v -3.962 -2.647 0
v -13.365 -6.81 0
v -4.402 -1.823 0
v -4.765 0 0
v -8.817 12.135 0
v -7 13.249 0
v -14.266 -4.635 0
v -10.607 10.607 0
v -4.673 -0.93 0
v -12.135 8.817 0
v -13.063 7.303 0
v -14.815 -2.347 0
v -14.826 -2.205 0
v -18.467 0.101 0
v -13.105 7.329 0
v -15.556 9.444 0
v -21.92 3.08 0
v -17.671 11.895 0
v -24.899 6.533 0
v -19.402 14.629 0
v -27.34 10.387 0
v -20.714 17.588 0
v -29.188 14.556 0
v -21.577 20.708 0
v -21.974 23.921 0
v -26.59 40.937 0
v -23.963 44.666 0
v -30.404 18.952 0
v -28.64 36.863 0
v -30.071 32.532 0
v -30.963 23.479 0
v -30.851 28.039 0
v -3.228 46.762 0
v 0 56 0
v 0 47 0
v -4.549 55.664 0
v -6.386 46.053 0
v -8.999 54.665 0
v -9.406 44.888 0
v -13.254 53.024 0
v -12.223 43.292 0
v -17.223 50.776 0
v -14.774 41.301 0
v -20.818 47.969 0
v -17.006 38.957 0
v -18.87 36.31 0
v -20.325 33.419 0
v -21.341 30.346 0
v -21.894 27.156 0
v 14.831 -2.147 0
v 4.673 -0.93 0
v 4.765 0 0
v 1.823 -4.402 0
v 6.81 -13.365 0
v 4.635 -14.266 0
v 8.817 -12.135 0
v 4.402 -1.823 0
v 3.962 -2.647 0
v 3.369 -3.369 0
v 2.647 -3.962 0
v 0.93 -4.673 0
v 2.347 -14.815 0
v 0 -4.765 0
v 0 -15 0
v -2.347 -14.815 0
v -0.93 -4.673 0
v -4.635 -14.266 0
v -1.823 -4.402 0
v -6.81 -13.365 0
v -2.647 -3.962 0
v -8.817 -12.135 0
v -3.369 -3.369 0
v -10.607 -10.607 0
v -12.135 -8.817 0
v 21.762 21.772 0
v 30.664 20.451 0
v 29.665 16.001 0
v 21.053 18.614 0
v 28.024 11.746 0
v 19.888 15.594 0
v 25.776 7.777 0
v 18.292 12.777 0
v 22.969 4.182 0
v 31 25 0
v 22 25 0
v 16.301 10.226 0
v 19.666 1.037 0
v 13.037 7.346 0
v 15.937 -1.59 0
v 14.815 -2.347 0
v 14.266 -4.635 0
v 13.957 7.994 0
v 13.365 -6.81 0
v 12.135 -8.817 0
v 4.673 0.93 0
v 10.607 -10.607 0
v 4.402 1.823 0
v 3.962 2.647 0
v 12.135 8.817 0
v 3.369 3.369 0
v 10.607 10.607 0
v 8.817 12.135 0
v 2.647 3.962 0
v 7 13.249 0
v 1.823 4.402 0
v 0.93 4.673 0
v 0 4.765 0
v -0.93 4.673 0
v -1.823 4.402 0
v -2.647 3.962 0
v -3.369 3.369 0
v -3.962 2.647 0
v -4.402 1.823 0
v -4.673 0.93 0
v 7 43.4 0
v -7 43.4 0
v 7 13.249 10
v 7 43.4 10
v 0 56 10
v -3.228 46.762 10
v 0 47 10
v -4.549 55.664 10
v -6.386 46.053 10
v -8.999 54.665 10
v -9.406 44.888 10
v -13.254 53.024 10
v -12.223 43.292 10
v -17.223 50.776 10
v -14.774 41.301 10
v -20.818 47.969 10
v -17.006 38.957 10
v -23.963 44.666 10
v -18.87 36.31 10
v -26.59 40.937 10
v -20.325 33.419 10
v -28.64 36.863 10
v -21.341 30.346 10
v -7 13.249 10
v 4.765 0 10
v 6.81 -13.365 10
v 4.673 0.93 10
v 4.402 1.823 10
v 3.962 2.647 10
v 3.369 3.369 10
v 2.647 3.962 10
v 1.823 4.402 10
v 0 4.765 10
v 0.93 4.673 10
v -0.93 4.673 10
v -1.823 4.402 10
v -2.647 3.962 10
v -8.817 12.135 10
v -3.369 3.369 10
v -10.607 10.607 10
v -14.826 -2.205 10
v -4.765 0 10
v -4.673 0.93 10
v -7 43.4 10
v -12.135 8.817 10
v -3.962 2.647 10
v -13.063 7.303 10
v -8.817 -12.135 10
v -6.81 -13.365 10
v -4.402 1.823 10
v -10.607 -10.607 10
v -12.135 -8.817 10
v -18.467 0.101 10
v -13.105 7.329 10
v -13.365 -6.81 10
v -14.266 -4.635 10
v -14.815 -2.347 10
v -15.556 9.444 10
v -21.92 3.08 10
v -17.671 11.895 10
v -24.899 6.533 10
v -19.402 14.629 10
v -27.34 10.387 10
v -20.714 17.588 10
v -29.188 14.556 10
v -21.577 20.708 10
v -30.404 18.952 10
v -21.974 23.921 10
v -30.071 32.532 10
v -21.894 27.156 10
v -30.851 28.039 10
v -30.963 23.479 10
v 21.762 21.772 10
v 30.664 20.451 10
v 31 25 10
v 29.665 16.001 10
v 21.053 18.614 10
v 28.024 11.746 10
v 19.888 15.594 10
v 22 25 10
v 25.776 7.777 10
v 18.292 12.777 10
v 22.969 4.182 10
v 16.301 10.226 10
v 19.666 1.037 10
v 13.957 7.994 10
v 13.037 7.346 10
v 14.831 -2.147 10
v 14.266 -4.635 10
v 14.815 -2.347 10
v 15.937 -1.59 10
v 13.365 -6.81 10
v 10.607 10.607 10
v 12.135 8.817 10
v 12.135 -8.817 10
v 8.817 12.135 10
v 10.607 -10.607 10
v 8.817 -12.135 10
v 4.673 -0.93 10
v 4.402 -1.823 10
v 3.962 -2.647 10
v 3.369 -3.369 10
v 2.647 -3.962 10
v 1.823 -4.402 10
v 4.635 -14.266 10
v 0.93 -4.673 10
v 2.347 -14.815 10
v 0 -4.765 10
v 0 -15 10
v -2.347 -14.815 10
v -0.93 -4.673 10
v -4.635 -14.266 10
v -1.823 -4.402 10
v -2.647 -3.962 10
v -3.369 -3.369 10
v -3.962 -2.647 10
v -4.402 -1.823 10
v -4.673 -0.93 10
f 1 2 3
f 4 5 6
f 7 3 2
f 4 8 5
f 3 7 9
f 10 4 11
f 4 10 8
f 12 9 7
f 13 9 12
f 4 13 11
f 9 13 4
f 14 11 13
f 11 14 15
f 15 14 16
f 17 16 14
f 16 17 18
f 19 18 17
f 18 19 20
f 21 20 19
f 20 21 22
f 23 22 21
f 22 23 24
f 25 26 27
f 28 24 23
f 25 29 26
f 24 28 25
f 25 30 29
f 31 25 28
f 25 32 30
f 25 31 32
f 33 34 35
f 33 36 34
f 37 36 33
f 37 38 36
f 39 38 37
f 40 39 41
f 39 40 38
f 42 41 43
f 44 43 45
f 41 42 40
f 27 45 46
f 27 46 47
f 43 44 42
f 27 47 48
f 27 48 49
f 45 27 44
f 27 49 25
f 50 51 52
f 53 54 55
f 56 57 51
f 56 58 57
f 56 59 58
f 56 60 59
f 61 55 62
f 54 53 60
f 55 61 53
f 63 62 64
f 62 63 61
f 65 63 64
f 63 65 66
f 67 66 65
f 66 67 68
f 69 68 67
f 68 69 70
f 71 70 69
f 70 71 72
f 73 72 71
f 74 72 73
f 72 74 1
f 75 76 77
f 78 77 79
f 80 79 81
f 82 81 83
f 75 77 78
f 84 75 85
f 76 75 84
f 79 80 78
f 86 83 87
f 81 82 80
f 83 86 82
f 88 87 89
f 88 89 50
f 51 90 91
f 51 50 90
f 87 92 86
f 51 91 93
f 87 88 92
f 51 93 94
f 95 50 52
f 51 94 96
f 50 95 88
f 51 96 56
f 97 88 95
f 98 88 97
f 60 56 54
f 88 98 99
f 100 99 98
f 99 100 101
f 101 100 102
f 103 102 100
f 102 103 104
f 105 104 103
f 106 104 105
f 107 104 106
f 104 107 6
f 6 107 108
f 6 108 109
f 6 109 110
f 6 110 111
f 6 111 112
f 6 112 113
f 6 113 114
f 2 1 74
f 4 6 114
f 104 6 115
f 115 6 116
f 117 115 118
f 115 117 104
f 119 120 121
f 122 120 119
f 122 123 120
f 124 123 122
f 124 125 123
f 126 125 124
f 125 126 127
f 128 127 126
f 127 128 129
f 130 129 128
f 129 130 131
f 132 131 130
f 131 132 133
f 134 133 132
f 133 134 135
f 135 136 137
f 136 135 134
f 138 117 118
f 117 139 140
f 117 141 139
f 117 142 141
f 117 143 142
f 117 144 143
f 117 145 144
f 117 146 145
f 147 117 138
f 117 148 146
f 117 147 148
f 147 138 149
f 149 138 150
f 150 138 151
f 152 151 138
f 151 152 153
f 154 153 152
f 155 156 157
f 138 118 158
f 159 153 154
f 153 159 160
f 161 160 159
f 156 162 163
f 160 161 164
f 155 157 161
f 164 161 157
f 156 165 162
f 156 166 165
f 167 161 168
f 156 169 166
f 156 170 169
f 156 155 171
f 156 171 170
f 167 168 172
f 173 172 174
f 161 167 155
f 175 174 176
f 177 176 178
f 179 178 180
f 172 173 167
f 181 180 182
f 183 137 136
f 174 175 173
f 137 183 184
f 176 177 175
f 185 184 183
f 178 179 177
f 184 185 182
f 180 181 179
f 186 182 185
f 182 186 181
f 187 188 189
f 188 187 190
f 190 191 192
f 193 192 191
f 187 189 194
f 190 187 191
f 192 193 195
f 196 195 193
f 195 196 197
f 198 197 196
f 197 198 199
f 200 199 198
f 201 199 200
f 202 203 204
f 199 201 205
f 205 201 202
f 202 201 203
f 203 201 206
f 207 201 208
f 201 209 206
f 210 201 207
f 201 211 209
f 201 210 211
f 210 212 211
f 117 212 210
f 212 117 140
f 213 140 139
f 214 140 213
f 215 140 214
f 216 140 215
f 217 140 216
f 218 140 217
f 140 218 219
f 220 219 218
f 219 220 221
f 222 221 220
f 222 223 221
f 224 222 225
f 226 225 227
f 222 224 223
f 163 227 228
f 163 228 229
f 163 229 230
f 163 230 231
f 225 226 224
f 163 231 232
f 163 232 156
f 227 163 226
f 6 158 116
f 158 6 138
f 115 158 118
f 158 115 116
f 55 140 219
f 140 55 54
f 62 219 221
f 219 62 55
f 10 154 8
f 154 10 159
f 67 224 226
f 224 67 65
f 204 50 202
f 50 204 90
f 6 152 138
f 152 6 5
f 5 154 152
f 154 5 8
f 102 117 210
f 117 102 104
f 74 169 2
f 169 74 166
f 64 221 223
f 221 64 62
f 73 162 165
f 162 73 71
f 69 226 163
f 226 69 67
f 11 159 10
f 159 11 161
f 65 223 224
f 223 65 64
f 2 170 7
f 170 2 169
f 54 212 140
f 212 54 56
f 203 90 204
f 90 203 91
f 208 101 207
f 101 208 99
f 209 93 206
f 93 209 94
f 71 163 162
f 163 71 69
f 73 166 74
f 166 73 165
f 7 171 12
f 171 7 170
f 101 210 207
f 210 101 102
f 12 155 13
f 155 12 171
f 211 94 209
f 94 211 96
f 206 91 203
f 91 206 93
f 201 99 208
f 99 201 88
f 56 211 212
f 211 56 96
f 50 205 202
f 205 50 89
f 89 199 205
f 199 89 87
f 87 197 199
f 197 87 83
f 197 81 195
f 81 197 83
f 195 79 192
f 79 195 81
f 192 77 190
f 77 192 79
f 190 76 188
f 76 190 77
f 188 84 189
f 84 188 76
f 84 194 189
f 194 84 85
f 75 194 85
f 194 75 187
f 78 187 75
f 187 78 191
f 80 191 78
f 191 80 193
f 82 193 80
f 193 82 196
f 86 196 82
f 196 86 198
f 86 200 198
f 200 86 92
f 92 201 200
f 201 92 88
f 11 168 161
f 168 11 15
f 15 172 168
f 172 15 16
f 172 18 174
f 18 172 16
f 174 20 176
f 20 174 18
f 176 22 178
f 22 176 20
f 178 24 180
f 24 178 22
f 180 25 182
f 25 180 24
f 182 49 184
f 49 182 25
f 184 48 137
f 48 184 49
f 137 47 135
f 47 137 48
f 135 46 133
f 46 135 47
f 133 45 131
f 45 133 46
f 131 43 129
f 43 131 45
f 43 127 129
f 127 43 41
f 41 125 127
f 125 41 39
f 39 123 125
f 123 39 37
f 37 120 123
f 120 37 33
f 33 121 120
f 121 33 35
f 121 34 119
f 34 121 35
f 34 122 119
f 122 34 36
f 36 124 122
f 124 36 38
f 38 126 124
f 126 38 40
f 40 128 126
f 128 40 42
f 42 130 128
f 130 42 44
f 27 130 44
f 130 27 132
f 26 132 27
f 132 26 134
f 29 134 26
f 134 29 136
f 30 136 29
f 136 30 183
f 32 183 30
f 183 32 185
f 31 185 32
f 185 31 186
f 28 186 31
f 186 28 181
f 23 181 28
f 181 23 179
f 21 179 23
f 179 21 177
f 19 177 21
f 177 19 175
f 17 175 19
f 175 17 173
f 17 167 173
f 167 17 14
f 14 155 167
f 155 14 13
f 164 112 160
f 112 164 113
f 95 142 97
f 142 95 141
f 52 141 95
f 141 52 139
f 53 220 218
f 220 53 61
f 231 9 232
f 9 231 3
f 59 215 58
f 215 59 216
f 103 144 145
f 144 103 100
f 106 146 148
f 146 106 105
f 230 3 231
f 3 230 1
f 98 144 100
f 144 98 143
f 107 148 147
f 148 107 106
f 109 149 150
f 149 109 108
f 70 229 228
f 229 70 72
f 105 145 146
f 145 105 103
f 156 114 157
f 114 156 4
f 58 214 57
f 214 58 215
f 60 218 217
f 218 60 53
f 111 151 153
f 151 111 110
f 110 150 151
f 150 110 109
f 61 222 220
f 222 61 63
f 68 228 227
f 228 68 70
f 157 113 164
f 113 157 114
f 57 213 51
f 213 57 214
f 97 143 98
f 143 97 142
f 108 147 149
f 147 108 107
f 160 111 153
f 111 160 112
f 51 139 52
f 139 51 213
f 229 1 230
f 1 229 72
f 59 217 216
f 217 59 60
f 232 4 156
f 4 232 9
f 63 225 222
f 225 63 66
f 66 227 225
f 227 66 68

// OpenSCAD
$fn = 32;

// ----------------------------------------------------------------------
// Hook: 50 mm shank into a 22 mm curl, 10 mm thick
// ----------------------------------------------------------------------

// --- parameters (mm) ---
shank_len = 50;           // shank length from the boss centre
shank_w = 14;             // shank width
boss_d = 30;              // boss diameter
bore_d = 9.53;            // boss bore
curl_in = 22;             // curl inner radius
curl_out = 31;            // curl outer radius
curl_sweep = 270;         // curl sweep angle
hook_t = 10;              // hook thickness

shank_profile = [[-7, 43.4], [7, 43.4], [7, 13], [-7, 13]];
boss_profile = [[15, 0], [14.815, 2.347], [14.266, 4.635], [13.365, 6.81], [12.135, 8.817], [10.607, 10.607], [8.817, 12.135], [6.81, 13.365], [4.635, 14.266], [2.347, 14.815], [0, 15], [-2.347, 14.815], [-4.635, 14.266], [-6.81, 13.365], [-8.817, 12.135], [-10.607, 10.607], [-12.135, 8.817], [-13.365, 6.81], [-14.266, 4.635], [-14.815, 2.347], [-15, 0], [-14.815, -2.347], [-14.266, -4.635], [-13.365, -6.81], [-12.135, -8.817], [-10.607, -10.607], [-8.817, -12.135], [-6.81, -13.365], [-4.635, -14.266], [-2.347, -14.815], [0, -15], [2.347, -14.815], [4.635, -14.266], [6.81, -13.365], [8.817, -12.135], [10.607, -10.607], [12.135, -8.817], [13.365, -6.81], [14.266, -4.635], [14.815, -2.347]];
curl_profile = [[0, 56], [-4.549, 55.664], [-8.999, 54.665], [-13.254, 53.024], [-17.223, 50.776], [-20.818, 47.969], [-23.963, 44.666], [-26.59, 40.937], [-28.64, 36.863], [-30.071, 32.532], [-30.851, 28.039], [-30.963, 23.479], [-30.404, 18.952], [-29.188, 14.556], [-27.34, 10.387], [-24.899, 6.533], [-21.92, 3.08], [-18.467, 0.101], [-14.613, -2.34], [-10.444, -4.188], [-6.048, -5.404], [-1.521, -5.963], [3.039, -5.851], [7.532, -5.071], [11.863, -3.64], [15.937, -1.59], [19.666, 1.037], [22.969, 4.182], [25.776, 7.777], [28.024, 11.746], [29.665, 16.001], [30.664, 20.451], [31, 25], [22, 25], [21.762, 21.772], [21.053, 18.614], [19.888, 15.594], [18.292, 12.777], [16.301, 10.226], [13.957, 7.994], [11.31, 6.13], [8.419, 4.675], [5.346, 3.659], [2.156, 3.106], [-1.079, 3.026], [-4.292, 3.423], [-7.412, 4.286], [-10.371, 5.598], [-13.105, 7.329], [-15.556, 9.444], [-17.671, 11.895], [-19.402, 14.629], [-20.714, 17.588], [-21.577, 20.708], [-21.974, 23.921], [-21.894, 27.156], [-21.341, 30.346], [-20.325, 33.419], [-18.87, 36.31], [-17.006, 38.957], [-14.774, 41.301], [-12.223, 43.292], [-9.406, 44.888], [-6.386, 46.053], [-3.228, 46.762], [0, 47]];

difference() {
  union() {
    /* three overlapping outlines: shank, boss and the smooth curl */
    linear_extrude(height = hook_t) polygon(shank_profile);
    linear_extrude(height = hook_t) polygon(boss_profile);
    linear_extrude(height = hook_t) polygon(curl_profile);
  }
  translate([0, 0, -2.5]) cylinder(h = hook_t + 5, d = bore_d);
}
